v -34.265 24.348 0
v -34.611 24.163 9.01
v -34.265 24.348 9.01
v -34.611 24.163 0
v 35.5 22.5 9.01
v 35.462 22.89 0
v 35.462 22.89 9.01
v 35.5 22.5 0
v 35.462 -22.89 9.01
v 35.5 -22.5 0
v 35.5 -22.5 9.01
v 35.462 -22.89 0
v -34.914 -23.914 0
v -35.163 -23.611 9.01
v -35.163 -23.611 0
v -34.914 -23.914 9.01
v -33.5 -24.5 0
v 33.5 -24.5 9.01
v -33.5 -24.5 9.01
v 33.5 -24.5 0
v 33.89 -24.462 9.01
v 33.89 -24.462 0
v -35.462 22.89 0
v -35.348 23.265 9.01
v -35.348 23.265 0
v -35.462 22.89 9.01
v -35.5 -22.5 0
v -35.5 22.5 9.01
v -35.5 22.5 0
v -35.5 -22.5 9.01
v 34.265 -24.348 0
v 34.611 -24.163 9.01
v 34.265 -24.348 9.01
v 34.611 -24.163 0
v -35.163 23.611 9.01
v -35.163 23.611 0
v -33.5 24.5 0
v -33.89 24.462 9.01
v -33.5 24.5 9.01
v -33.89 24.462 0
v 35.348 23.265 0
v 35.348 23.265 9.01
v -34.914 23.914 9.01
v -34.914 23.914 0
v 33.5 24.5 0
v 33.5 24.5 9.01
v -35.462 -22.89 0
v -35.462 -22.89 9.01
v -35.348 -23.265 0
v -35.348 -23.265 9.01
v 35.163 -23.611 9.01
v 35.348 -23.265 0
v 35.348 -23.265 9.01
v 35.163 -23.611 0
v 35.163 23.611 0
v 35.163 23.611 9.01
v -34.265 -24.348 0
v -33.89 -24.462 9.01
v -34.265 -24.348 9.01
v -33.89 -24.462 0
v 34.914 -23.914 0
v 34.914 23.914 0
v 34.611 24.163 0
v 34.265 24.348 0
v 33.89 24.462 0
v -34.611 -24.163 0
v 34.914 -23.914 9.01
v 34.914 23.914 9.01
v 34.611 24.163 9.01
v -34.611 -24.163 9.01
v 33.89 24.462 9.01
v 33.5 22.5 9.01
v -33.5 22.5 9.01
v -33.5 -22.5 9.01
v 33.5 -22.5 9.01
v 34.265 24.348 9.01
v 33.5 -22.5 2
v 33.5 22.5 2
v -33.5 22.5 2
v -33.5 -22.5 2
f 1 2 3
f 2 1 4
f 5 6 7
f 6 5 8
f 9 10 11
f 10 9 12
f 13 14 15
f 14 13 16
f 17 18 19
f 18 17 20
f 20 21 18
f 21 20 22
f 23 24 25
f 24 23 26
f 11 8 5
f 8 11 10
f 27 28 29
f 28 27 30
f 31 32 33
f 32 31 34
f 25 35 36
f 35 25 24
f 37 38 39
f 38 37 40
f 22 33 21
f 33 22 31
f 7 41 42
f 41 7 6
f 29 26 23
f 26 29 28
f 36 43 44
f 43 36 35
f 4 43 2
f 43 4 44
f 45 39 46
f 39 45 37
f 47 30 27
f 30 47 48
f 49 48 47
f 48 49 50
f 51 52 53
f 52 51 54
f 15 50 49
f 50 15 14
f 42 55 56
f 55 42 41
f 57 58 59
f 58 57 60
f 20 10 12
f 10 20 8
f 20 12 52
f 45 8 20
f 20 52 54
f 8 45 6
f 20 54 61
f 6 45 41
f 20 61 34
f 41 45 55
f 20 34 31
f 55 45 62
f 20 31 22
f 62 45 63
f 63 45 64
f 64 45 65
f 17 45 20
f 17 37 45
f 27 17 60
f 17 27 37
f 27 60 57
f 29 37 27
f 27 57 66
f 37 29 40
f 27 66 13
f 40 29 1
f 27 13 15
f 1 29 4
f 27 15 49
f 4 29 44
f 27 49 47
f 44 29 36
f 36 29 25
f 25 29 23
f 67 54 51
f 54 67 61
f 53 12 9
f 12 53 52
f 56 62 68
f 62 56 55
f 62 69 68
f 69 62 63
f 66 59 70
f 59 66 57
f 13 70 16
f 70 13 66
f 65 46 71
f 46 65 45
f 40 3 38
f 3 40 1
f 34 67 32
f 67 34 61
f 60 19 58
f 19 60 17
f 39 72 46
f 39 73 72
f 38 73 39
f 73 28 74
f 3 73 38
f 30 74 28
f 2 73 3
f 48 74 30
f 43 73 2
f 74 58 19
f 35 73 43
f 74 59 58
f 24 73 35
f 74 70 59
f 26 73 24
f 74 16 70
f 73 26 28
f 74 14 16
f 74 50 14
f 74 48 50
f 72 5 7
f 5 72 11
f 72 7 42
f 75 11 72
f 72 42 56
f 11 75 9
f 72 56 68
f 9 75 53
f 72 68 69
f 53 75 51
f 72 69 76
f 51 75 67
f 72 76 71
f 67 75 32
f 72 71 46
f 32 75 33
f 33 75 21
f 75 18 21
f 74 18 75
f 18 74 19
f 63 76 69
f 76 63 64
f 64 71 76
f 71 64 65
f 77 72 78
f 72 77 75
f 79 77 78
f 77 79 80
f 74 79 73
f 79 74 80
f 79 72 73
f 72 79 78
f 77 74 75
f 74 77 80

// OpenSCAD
board_w=64; board_h=42; wall=2; clearance=1.5; base_d=9; lid_d=13;
outer_w=board_w+2*clearance+2*wall; outer_h=board_h+2*clearance+2*wall;
module rb(w,h,d,r=2){minkowski(){cube([w-2*r,h-2*r,d],center=true);cylinder(r=r,h=.01,$fn=32);}}
module base(){difference(){translate([0,0,base_d/2])rb(outer_w,outer_h,base_d,2);translate([0,0,base_d/2+wall])cube([outer_w-2*wall,outer_h-2*wall,base_d],center=true);}}
module lid(){difference(){translate([0,0,lid_d/2])rb(outer_w,outer_h,lid_d,2);translate([0,0,lid_d/2-wall])cube([outer_w-2*wall,outer_h-2*wall,lid_d],center=true);for(y=[-outer_h/2+6:5:outer_h/2-6])translate([0,y,lid_d-wall/2])cube([outer_w-12,2.5,wall+2],center=true);}}
base();
